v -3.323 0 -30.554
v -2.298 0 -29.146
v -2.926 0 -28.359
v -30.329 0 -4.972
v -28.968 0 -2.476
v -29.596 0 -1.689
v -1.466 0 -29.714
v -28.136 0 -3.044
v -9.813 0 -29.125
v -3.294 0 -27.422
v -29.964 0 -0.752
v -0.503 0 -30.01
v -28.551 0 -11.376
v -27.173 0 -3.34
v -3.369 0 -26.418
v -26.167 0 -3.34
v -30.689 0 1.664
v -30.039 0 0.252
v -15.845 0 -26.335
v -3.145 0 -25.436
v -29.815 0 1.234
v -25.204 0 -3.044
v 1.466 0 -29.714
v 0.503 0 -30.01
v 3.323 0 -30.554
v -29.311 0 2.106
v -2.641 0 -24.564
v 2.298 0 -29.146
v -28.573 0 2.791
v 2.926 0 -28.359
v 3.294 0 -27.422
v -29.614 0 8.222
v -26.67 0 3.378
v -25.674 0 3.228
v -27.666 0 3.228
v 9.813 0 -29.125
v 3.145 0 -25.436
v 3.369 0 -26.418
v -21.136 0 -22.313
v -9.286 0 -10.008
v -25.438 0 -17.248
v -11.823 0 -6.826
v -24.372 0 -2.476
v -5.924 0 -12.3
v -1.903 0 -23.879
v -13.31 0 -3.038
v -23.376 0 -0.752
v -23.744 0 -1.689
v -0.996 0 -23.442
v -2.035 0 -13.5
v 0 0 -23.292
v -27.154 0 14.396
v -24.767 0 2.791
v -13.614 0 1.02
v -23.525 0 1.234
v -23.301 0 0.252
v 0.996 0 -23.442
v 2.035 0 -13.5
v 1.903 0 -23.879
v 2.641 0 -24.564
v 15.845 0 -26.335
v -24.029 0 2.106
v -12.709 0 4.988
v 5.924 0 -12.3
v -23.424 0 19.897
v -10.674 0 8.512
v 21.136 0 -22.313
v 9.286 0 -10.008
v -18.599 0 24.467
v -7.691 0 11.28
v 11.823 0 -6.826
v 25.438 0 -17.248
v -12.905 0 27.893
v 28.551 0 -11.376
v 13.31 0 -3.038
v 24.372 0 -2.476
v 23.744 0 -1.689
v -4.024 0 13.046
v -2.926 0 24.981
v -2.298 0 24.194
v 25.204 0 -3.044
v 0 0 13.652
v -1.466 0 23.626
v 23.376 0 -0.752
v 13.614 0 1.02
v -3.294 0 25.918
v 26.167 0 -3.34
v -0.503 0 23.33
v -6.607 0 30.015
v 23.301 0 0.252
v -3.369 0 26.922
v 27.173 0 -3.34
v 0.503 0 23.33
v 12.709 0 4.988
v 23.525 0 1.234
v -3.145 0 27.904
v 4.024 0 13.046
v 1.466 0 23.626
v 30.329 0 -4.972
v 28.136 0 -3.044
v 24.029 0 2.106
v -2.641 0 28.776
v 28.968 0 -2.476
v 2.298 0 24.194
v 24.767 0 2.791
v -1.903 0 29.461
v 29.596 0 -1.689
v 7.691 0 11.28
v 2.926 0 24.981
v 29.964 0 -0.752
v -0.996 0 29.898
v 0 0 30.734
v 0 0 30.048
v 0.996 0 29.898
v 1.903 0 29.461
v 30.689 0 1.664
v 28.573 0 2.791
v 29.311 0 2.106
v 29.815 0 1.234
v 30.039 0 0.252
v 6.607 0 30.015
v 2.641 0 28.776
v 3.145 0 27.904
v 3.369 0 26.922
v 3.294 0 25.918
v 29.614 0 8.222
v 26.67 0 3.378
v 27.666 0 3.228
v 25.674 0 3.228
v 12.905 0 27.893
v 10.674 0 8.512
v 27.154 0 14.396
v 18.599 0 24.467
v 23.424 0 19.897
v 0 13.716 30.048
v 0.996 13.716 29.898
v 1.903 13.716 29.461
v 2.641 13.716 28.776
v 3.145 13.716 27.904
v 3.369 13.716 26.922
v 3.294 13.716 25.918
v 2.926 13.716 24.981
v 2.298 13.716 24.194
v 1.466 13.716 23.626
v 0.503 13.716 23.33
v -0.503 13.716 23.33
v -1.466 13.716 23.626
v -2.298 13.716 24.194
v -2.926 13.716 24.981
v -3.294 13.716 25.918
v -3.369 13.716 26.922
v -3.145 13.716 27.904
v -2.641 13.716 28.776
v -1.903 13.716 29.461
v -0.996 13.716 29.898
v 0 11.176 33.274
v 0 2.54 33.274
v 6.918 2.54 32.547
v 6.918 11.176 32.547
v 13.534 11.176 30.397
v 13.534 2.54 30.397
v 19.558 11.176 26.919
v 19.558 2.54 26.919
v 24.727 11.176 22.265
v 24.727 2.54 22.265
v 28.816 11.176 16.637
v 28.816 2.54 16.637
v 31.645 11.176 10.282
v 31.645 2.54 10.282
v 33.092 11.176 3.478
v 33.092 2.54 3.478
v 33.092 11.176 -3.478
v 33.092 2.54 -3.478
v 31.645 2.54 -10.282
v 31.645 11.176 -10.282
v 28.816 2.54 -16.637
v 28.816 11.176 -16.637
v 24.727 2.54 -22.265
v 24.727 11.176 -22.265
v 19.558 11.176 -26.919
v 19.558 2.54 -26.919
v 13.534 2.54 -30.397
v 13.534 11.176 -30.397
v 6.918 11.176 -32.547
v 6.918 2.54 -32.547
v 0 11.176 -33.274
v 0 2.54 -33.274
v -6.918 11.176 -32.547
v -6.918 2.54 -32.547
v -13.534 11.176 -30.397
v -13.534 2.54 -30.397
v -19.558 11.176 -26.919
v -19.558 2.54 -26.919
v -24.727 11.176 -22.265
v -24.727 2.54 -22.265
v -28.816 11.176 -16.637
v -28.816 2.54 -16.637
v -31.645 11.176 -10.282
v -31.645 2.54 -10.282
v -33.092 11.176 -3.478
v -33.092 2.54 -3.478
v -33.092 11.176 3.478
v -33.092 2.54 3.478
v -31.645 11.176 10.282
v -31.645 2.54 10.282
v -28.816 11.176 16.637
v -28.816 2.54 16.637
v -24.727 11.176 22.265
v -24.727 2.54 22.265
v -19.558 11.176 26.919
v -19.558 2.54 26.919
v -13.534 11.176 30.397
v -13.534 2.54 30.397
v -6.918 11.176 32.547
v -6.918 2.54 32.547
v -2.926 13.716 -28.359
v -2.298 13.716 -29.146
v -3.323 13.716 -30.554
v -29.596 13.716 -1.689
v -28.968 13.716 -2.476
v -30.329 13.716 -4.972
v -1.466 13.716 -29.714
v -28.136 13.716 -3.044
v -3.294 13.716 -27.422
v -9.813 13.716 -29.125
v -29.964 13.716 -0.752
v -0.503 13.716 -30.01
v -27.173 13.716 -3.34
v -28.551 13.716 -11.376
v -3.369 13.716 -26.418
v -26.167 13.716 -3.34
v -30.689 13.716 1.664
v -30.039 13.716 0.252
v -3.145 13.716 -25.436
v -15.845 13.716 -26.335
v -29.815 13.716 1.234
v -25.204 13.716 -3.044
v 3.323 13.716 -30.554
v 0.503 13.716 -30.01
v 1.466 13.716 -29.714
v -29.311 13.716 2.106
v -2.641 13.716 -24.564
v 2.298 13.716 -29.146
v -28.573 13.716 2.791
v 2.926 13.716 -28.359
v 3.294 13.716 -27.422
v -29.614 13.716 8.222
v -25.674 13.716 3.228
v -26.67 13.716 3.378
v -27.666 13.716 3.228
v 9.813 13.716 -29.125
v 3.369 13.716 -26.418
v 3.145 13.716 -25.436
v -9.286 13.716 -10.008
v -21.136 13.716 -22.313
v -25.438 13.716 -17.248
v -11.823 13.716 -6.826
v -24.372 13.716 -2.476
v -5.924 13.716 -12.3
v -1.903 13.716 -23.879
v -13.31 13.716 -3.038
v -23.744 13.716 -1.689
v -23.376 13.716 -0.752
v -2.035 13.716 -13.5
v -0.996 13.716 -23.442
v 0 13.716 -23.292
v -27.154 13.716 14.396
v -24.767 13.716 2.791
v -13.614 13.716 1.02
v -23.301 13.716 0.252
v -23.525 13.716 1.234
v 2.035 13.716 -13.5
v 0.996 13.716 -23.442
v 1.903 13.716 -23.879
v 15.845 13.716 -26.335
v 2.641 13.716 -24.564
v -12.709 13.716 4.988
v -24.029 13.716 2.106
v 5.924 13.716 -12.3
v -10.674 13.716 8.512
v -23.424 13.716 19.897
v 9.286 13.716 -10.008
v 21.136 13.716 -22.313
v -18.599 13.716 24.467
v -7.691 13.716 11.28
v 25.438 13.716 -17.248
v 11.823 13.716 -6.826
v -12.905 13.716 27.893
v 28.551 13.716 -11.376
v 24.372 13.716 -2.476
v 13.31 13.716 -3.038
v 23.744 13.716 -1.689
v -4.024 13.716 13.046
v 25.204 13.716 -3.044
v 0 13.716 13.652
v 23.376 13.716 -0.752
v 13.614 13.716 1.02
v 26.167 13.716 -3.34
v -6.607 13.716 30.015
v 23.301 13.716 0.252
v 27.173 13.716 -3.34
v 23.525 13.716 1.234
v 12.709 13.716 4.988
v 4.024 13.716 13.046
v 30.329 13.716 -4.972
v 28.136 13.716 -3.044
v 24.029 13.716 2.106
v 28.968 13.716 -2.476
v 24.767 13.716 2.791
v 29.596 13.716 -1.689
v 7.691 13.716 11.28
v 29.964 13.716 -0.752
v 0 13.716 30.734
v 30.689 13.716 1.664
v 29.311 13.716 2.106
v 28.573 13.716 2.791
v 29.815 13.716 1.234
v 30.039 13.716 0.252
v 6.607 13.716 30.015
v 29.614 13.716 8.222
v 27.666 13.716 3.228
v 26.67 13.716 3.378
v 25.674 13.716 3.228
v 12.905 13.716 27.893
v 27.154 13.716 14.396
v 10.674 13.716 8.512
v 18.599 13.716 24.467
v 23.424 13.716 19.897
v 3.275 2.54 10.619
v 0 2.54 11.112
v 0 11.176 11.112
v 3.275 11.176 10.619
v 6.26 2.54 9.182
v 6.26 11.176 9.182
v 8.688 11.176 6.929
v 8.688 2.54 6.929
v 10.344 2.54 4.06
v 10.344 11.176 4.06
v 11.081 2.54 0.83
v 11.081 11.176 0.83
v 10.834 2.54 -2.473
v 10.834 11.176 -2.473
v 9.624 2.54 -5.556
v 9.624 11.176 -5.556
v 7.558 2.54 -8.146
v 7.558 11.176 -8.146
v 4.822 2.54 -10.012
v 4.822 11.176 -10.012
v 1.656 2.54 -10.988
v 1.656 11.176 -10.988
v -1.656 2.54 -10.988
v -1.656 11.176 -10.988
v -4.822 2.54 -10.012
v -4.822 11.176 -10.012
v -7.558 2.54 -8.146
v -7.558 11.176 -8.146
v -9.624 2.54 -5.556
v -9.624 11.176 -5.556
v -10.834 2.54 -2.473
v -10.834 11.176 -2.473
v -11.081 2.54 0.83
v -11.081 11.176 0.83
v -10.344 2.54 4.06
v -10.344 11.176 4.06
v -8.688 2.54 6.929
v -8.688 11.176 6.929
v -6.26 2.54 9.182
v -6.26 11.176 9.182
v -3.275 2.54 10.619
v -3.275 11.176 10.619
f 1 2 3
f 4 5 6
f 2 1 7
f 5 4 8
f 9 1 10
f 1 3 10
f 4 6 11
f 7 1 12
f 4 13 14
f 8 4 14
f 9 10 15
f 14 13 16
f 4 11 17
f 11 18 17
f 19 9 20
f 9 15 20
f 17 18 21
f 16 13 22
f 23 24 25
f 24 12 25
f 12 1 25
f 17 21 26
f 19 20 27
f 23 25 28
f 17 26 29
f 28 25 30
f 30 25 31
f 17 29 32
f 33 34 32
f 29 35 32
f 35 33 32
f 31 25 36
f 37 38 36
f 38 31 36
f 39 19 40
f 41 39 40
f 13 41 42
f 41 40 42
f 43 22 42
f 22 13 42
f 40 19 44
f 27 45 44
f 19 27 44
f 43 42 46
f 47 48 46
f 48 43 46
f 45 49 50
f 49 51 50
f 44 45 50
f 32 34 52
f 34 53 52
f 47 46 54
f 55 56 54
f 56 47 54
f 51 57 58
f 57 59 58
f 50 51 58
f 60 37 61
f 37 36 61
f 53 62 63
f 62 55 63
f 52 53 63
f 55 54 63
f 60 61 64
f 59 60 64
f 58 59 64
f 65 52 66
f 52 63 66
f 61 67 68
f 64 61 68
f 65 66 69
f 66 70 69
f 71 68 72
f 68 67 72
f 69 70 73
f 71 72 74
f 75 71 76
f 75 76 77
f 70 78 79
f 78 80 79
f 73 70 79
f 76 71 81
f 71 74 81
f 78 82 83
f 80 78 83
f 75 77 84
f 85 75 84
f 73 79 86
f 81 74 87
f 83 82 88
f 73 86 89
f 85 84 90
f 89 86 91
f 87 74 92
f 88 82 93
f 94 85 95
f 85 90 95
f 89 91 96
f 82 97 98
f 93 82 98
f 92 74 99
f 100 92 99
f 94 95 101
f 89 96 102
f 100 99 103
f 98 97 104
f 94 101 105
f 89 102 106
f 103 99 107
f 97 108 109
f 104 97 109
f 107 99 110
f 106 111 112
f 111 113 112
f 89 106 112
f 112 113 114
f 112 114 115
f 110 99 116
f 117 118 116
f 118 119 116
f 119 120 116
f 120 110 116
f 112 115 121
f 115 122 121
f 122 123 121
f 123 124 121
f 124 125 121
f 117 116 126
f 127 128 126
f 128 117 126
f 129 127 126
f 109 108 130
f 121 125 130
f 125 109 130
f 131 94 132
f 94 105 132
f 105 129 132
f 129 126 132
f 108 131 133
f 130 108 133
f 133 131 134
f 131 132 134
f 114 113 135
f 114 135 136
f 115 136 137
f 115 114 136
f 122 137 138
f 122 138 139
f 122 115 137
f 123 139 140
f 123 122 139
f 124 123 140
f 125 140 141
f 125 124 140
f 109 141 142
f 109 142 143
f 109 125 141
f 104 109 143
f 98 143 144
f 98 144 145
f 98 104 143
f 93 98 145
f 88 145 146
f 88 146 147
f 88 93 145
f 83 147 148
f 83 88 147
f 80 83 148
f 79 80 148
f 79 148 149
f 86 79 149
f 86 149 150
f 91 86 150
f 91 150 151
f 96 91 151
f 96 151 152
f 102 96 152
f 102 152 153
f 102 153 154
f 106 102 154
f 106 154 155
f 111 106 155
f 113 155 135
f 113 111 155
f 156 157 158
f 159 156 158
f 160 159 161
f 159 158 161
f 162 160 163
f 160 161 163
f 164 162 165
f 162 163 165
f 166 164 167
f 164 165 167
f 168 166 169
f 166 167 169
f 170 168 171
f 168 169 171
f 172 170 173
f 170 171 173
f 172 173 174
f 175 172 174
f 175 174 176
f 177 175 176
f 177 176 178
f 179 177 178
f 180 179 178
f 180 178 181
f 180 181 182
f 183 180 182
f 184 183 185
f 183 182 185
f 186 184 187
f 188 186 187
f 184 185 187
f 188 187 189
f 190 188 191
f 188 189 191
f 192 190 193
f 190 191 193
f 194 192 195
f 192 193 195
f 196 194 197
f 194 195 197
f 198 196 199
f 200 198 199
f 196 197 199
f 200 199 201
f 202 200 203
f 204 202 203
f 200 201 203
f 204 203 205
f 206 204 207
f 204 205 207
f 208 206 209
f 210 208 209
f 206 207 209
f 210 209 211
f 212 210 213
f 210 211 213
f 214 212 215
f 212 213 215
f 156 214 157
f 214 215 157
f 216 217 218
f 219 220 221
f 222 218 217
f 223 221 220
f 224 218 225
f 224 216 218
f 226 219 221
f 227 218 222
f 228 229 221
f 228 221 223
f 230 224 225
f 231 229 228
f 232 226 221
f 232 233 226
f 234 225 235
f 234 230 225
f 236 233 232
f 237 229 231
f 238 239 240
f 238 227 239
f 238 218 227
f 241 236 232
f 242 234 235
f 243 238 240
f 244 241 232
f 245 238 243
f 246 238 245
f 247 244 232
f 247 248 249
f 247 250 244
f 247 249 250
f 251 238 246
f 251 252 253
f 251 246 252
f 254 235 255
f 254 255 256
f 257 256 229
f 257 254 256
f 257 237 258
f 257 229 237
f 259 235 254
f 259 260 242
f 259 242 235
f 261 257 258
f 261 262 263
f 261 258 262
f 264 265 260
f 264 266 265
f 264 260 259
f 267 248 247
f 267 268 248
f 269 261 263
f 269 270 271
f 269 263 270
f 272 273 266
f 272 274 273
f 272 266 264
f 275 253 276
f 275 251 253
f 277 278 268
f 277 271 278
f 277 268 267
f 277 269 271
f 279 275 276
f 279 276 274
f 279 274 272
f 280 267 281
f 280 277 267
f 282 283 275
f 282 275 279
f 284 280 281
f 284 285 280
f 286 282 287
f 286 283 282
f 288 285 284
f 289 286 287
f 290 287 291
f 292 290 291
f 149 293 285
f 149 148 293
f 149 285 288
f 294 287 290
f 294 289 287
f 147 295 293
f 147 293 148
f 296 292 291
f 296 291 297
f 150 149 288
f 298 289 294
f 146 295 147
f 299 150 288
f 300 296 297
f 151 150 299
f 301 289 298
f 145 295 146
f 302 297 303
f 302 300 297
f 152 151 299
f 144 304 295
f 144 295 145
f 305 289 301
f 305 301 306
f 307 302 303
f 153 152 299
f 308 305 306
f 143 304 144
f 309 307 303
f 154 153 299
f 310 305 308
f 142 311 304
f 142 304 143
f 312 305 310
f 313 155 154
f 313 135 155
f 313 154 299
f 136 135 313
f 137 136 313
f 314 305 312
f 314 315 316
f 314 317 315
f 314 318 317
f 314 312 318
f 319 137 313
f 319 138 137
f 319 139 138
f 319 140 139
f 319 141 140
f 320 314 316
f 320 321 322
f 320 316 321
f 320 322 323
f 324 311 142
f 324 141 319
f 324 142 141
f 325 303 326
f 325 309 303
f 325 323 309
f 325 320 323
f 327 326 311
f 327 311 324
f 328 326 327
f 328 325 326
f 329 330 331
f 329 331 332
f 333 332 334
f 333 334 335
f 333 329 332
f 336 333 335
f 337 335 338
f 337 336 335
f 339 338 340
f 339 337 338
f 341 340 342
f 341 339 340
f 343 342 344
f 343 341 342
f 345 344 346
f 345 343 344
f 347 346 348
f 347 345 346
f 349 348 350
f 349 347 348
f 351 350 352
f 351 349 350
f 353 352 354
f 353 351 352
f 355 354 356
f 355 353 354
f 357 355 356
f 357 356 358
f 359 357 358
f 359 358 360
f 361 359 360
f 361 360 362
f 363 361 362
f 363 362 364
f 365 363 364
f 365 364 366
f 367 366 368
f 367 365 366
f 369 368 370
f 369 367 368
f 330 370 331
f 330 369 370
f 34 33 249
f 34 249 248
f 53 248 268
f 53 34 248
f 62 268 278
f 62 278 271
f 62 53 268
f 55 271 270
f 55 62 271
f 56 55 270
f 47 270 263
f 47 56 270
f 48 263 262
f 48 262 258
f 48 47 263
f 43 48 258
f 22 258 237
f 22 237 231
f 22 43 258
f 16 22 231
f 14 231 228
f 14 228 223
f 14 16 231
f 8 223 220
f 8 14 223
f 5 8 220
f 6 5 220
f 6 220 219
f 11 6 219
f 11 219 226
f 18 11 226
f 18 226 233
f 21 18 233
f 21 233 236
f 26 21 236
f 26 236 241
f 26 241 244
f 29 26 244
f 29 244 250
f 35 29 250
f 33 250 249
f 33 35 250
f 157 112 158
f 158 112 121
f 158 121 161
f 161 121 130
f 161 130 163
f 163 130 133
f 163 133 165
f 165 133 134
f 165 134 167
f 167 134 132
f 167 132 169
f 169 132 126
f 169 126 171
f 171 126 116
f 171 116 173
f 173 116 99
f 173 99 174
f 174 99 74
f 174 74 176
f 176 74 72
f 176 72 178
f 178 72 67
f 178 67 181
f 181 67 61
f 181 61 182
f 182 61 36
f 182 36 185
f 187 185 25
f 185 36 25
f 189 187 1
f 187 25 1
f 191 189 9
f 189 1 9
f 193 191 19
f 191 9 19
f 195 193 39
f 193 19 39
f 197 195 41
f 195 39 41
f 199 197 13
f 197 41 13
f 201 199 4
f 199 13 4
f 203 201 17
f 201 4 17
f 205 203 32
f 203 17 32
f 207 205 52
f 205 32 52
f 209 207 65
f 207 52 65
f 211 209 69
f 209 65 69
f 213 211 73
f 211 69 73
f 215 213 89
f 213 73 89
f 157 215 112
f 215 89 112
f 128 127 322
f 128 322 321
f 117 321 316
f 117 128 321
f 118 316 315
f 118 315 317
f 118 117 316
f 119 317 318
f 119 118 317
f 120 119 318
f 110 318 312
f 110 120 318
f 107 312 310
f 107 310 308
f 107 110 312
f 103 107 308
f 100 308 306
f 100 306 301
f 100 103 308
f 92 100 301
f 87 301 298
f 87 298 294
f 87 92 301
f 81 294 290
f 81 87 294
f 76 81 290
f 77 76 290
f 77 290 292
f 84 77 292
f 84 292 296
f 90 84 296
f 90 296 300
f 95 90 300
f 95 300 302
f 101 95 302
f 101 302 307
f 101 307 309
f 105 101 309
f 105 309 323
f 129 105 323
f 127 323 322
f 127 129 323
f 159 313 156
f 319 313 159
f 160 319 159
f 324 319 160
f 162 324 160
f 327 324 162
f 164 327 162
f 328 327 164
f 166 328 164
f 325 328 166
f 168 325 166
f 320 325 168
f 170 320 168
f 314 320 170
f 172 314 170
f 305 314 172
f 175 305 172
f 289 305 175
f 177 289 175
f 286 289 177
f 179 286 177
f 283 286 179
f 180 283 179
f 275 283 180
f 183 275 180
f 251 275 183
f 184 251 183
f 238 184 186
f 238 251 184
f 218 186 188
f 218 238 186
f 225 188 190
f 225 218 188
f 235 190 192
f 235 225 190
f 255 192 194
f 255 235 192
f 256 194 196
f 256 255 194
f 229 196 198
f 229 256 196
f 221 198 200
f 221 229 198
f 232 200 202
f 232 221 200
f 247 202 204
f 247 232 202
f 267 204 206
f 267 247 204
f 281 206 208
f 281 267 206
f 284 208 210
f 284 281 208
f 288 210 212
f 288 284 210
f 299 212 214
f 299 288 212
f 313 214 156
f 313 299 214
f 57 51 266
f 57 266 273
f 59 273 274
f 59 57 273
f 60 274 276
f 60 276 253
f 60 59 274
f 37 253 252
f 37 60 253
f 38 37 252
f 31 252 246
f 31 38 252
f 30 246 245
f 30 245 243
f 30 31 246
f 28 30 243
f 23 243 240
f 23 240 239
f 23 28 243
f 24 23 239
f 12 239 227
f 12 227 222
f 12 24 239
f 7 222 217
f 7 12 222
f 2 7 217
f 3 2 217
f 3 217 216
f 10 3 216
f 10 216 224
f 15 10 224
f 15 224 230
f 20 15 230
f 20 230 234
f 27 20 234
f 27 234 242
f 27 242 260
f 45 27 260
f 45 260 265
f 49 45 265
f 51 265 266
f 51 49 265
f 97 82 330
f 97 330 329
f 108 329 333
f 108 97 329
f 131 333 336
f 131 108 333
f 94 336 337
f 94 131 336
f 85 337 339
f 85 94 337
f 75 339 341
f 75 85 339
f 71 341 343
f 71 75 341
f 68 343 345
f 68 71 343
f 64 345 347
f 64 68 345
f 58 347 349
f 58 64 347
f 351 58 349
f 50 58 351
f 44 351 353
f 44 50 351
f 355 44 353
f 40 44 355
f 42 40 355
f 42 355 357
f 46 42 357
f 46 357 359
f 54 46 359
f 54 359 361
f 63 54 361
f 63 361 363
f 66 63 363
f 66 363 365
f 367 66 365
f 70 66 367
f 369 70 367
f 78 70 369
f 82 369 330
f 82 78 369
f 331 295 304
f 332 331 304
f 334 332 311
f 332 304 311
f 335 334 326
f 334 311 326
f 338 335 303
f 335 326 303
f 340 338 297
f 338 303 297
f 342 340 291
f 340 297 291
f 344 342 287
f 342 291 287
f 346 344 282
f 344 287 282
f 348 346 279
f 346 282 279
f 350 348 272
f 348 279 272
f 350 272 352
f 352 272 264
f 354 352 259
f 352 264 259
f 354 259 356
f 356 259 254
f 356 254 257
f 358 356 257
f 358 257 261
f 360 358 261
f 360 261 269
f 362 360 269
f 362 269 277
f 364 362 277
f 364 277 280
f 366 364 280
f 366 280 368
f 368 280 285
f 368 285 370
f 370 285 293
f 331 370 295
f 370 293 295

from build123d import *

# Parameters (mm, degrees)
SKETCH1_R           = 33.274
SKETCH1_R_2         = 11.1125
SKETCH1_R_3         = 3.3782
BOSS_EXTRUDE1_DEPTH = 13.716
CHAMFER1_SIZE       = 2.54


with BuildPart() as part:
    # Sketch1 → Boss-Extrude1 (new body)
    with BuildSketch(Plane(origin=(0, 0, 0), x_dir=(1, 0, 0), z_dir=(0, 1, 0))):
        with Locations(Location((0, 0, 0), (0, 0, 270))):
            Circle(SKETCH1_R)
        with Locations(Location((0, 0, 0), (0, 0, 270))):
            Circle(SKETCH1_R_2, mode=Mode.SUBTRACT)
        with Locations(Location((0, 26.67, 0), (0, 0, 270))):
            Circle(SKETCH1_R_3, mode=Mode.SUBTRACT)
        with Locations(Location((26.67, 0, 0), (0, 0, 270))):
            Circle(SKETCH1_R_3, mode=Mode.SUBTRACT)
        with Locations(Location((0, -26.67, 0), (0, 0, 270))):
            Circle(SKETCH1_R_3, mode=Mode.SUBTRACT)
        with Locations(Location((-26.67, 0, 0), (0, 0, 270))):
            Circle(SKETCH1_R_3, mode=Mode.SUBTRACT)
    extrude(amount=BOSS_EXTRUDE1_DEPTH)

    # Chamfer1
    chamfer1_edges = [part.edges().sort_by_distance(p)[0] for p in [
        (0, 0, -33.274),
        (0, 13.716, -33.274),
        (0, 0, -11.1125),
        (0, 13.716, -11.1125),
    ]]
    chamfer(chamfer1_edges, length=CHAMFER1_SIZE)


solid = part.part
